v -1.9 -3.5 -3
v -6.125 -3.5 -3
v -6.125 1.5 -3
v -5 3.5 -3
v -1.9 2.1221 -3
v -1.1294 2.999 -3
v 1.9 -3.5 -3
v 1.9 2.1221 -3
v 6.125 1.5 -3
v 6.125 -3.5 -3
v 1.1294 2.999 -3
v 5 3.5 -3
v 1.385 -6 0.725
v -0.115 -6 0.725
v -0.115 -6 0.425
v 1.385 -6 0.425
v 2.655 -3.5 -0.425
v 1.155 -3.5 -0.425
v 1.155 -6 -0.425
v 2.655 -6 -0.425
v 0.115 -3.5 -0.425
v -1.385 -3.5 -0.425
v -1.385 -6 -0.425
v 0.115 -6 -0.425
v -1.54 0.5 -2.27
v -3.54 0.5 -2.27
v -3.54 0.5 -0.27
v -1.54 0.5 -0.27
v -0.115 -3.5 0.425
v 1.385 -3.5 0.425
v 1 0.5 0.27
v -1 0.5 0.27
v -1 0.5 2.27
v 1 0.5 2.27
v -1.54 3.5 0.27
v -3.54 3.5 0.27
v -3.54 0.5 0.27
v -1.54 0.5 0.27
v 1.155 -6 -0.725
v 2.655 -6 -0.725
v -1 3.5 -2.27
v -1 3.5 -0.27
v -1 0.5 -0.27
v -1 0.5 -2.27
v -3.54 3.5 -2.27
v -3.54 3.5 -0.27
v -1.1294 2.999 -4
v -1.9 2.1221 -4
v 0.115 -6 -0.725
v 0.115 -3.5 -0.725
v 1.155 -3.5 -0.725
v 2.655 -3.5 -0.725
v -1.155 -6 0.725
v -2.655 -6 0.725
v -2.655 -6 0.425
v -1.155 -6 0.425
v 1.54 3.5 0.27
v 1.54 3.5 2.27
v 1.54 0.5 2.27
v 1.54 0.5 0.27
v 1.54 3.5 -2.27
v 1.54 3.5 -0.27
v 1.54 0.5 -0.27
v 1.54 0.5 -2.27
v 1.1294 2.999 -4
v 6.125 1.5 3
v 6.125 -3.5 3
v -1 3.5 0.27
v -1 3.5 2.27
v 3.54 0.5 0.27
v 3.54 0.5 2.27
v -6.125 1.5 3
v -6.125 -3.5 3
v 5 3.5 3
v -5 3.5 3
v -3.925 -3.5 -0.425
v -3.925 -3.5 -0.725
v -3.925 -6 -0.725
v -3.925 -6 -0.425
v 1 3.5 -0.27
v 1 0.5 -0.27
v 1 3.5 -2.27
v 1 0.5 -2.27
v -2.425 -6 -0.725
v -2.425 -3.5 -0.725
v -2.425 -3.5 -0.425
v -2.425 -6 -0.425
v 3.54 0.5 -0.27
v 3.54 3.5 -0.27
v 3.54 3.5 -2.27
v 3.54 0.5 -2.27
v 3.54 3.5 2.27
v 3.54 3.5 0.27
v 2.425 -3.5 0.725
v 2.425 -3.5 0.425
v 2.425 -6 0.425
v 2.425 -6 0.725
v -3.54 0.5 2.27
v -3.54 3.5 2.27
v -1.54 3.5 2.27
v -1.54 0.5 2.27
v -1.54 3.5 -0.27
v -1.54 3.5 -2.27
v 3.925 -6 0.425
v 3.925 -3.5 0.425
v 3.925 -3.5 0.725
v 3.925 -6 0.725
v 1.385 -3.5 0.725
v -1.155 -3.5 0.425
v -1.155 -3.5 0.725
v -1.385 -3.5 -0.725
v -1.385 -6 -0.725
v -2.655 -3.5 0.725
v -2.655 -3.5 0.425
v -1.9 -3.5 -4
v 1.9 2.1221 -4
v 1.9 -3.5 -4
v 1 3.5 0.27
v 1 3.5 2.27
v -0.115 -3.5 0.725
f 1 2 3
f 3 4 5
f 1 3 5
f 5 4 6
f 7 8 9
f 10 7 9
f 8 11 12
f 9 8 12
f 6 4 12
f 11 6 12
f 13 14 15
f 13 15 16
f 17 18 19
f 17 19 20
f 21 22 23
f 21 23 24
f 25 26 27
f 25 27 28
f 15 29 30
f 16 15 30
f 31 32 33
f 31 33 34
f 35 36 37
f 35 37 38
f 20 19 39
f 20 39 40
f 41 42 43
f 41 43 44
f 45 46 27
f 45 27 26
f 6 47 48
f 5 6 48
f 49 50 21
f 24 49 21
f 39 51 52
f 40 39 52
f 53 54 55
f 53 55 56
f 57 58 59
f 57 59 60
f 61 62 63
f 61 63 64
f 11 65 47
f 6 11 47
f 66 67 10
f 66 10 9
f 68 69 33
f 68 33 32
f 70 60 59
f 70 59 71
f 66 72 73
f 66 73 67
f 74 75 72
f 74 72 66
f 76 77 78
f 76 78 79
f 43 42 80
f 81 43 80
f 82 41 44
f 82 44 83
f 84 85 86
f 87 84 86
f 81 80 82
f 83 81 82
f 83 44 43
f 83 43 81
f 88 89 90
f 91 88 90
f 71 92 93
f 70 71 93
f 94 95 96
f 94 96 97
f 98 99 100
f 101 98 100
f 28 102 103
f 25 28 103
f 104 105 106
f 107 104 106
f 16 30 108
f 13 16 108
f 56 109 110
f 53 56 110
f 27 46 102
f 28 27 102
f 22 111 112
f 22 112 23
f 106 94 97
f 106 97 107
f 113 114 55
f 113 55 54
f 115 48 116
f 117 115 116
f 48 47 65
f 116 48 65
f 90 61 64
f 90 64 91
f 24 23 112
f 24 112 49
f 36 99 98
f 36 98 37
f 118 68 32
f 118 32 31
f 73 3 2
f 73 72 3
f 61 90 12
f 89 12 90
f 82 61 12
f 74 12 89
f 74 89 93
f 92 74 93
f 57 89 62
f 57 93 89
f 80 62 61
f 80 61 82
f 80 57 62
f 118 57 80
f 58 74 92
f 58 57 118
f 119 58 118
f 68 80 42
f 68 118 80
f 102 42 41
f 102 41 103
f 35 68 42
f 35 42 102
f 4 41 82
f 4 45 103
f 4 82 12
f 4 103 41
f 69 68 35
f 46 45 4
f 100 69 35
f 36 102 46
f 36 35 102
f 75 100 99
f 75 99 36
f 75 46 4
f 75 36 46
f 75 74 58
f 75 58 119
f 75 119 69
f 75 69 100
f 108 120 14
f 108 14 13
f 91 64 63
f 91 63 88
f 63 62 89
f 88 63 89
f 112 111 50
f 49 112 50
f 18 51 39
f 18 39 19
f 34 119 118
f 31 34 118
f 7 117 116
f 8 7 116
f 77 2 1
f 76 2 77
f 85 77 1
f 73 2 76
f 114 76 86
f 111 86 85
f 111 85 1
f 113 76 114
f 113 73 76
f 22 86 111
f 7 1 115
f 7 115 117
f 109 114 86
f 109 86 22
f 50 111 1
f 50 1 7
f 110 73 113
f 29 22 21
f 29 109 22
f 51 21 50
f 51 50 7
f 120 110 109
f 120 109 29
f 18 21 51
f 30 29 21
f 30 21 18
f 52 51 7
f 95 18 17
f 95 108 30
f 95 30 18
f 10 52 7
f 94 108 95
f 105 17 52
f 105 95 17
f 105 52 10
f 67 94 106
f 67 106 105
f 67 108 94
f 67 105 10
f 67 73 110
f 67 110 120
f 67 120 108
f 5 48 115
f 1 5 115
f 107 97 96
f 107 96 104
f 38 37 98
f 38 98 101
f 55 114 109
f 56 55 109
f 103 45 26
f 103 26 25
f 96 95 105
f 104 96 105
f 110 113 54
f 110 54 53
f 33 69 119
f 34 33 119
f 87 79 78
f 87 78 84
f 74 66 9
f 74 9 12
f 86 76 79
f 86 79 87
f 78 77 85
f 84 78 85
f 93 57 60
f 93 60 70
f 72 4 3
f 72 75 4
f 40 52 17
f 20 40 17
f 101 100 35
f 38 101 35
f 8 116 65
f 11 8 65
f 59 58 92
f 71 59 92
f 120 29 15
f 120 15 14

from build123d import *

# Parameters (mm, degrees)
EXTRUDE_1_DEPTH     = 3
EXTRUDE_START       = -4
EXTRUDE_2_DEPTH     = 1
SKETCH_2_W          = 2
SKETCH_2_H          = 2
CUT_EXTRUDE_1_DEPTH = 3
SKETCH_3_W          = 1.5
SKETCH_3_H          = 0.3
EXTRUDE_3_DEPTH     = 2.5


with BuildPart() as part:
    # Эскиз1 → Бобышка-Вытянуть1 (new, symmetric)
    with BuildSketch(Plane.XY):
        Polygon((-6.125, 1.5), (-6.125, -3.5), (-1.9, -3.5), (-1.9, 2.122094745), (-1.129392625, 2.998992793), (1.129392625, 2.998992793), (1.9, 2.122094745), (1.9, -3.5), (6.125, -3.5), (6.125, 1.5), (5, 3.5), (-5, 3.5), align=None)
        Polygon((-1.9, 2.122094745), (-1.9, -3.5), (1.9, -3.5), (1.9, 2.122094745), (1.129392625, 2.998992793), (-1.129392625, 2.998992793), align=None)
    extrude(amount=EXTRUDE_1_DEPTH, both=True)

    # Эскиз1<3> → Бобышка-Вытянуть2 (add)
    with BuildSketch(Plane.XY.offset(EXTRUDE_START)):
        Polygon((-1.9, 2.122094745), (-1.9, -3.5), (1.9, -3.5), (1.9, 2.122094745), (1.129392625, 2.998992793), (-1.129392625, 2.998992793), align=None)
    extrude(amount=EXTRUDE_2_DEPTH)

    # Эскиз2 → Вырез-Вытянуть1 (cut)
    with BuildSketch(Plane(origin=(0, 3.5, 0), x_dir=(1, 0, 0), z_dir=(0, 1, 0))):
        with Locations((0, 1.27)):
            Rectangle(SKETCH_2_W, SKETCH_2_H)
        with Locations((0, -1.27)):
            Rectangle(SKETCH_2_W, SKETCH_2_H)
        with Locations((2.54, 1.27)):
            Rectangle(SKETCH_2_W, SKETCH_2_H)
        with Locations((2.54, -1.27)):
            Rectangle(SKETCH_2_W, SKETCH_2_H)
        with Locations((-2.54, 1.27)):
            Rectangle(SKETCH_2_W, SKETCH_2_H)
        with Locations((-2.54, -1.27)):
            Rectangle(SKETCH_2_W, SKETCH_2_H)
    extrude(amount=-CUT_EXTRUDE_1_DEPTH, mode=Mode.SUBTRACT)

    # Эскиз3 → Бобышка-Вытянуть3 (add)
    with BuildSketch(Plane.XZ.offset(3.5)):
        with Locations((-3.175, -0.575)):
            Rectangle(SKETCH_3_W, SKETCH_3_H)
        with Locations((-1.905, 0.575)):
            Rectangle(SKETCH_3_W, SKETCH_3_H)
        with Locations((-0.635, -0.575)):
            Rectangle(SKETCH_3_W, SKETCH_3_H)
        with Locations((0.635, 0.575)):
            Rectangle(SKETCH_3_W, SKETCH_3_H)
        with Locations((1.905, -0.575)):
            Rectangle(SKETCH_3_W, SKETCH_3_H)
        with Locations((3.175, 0.575)):
            Rectangle(SKETCH_3_W, SKETCH_3_H)
    extrude(amount=EXTRUDE_3_DEPTH)


solid = part.part
